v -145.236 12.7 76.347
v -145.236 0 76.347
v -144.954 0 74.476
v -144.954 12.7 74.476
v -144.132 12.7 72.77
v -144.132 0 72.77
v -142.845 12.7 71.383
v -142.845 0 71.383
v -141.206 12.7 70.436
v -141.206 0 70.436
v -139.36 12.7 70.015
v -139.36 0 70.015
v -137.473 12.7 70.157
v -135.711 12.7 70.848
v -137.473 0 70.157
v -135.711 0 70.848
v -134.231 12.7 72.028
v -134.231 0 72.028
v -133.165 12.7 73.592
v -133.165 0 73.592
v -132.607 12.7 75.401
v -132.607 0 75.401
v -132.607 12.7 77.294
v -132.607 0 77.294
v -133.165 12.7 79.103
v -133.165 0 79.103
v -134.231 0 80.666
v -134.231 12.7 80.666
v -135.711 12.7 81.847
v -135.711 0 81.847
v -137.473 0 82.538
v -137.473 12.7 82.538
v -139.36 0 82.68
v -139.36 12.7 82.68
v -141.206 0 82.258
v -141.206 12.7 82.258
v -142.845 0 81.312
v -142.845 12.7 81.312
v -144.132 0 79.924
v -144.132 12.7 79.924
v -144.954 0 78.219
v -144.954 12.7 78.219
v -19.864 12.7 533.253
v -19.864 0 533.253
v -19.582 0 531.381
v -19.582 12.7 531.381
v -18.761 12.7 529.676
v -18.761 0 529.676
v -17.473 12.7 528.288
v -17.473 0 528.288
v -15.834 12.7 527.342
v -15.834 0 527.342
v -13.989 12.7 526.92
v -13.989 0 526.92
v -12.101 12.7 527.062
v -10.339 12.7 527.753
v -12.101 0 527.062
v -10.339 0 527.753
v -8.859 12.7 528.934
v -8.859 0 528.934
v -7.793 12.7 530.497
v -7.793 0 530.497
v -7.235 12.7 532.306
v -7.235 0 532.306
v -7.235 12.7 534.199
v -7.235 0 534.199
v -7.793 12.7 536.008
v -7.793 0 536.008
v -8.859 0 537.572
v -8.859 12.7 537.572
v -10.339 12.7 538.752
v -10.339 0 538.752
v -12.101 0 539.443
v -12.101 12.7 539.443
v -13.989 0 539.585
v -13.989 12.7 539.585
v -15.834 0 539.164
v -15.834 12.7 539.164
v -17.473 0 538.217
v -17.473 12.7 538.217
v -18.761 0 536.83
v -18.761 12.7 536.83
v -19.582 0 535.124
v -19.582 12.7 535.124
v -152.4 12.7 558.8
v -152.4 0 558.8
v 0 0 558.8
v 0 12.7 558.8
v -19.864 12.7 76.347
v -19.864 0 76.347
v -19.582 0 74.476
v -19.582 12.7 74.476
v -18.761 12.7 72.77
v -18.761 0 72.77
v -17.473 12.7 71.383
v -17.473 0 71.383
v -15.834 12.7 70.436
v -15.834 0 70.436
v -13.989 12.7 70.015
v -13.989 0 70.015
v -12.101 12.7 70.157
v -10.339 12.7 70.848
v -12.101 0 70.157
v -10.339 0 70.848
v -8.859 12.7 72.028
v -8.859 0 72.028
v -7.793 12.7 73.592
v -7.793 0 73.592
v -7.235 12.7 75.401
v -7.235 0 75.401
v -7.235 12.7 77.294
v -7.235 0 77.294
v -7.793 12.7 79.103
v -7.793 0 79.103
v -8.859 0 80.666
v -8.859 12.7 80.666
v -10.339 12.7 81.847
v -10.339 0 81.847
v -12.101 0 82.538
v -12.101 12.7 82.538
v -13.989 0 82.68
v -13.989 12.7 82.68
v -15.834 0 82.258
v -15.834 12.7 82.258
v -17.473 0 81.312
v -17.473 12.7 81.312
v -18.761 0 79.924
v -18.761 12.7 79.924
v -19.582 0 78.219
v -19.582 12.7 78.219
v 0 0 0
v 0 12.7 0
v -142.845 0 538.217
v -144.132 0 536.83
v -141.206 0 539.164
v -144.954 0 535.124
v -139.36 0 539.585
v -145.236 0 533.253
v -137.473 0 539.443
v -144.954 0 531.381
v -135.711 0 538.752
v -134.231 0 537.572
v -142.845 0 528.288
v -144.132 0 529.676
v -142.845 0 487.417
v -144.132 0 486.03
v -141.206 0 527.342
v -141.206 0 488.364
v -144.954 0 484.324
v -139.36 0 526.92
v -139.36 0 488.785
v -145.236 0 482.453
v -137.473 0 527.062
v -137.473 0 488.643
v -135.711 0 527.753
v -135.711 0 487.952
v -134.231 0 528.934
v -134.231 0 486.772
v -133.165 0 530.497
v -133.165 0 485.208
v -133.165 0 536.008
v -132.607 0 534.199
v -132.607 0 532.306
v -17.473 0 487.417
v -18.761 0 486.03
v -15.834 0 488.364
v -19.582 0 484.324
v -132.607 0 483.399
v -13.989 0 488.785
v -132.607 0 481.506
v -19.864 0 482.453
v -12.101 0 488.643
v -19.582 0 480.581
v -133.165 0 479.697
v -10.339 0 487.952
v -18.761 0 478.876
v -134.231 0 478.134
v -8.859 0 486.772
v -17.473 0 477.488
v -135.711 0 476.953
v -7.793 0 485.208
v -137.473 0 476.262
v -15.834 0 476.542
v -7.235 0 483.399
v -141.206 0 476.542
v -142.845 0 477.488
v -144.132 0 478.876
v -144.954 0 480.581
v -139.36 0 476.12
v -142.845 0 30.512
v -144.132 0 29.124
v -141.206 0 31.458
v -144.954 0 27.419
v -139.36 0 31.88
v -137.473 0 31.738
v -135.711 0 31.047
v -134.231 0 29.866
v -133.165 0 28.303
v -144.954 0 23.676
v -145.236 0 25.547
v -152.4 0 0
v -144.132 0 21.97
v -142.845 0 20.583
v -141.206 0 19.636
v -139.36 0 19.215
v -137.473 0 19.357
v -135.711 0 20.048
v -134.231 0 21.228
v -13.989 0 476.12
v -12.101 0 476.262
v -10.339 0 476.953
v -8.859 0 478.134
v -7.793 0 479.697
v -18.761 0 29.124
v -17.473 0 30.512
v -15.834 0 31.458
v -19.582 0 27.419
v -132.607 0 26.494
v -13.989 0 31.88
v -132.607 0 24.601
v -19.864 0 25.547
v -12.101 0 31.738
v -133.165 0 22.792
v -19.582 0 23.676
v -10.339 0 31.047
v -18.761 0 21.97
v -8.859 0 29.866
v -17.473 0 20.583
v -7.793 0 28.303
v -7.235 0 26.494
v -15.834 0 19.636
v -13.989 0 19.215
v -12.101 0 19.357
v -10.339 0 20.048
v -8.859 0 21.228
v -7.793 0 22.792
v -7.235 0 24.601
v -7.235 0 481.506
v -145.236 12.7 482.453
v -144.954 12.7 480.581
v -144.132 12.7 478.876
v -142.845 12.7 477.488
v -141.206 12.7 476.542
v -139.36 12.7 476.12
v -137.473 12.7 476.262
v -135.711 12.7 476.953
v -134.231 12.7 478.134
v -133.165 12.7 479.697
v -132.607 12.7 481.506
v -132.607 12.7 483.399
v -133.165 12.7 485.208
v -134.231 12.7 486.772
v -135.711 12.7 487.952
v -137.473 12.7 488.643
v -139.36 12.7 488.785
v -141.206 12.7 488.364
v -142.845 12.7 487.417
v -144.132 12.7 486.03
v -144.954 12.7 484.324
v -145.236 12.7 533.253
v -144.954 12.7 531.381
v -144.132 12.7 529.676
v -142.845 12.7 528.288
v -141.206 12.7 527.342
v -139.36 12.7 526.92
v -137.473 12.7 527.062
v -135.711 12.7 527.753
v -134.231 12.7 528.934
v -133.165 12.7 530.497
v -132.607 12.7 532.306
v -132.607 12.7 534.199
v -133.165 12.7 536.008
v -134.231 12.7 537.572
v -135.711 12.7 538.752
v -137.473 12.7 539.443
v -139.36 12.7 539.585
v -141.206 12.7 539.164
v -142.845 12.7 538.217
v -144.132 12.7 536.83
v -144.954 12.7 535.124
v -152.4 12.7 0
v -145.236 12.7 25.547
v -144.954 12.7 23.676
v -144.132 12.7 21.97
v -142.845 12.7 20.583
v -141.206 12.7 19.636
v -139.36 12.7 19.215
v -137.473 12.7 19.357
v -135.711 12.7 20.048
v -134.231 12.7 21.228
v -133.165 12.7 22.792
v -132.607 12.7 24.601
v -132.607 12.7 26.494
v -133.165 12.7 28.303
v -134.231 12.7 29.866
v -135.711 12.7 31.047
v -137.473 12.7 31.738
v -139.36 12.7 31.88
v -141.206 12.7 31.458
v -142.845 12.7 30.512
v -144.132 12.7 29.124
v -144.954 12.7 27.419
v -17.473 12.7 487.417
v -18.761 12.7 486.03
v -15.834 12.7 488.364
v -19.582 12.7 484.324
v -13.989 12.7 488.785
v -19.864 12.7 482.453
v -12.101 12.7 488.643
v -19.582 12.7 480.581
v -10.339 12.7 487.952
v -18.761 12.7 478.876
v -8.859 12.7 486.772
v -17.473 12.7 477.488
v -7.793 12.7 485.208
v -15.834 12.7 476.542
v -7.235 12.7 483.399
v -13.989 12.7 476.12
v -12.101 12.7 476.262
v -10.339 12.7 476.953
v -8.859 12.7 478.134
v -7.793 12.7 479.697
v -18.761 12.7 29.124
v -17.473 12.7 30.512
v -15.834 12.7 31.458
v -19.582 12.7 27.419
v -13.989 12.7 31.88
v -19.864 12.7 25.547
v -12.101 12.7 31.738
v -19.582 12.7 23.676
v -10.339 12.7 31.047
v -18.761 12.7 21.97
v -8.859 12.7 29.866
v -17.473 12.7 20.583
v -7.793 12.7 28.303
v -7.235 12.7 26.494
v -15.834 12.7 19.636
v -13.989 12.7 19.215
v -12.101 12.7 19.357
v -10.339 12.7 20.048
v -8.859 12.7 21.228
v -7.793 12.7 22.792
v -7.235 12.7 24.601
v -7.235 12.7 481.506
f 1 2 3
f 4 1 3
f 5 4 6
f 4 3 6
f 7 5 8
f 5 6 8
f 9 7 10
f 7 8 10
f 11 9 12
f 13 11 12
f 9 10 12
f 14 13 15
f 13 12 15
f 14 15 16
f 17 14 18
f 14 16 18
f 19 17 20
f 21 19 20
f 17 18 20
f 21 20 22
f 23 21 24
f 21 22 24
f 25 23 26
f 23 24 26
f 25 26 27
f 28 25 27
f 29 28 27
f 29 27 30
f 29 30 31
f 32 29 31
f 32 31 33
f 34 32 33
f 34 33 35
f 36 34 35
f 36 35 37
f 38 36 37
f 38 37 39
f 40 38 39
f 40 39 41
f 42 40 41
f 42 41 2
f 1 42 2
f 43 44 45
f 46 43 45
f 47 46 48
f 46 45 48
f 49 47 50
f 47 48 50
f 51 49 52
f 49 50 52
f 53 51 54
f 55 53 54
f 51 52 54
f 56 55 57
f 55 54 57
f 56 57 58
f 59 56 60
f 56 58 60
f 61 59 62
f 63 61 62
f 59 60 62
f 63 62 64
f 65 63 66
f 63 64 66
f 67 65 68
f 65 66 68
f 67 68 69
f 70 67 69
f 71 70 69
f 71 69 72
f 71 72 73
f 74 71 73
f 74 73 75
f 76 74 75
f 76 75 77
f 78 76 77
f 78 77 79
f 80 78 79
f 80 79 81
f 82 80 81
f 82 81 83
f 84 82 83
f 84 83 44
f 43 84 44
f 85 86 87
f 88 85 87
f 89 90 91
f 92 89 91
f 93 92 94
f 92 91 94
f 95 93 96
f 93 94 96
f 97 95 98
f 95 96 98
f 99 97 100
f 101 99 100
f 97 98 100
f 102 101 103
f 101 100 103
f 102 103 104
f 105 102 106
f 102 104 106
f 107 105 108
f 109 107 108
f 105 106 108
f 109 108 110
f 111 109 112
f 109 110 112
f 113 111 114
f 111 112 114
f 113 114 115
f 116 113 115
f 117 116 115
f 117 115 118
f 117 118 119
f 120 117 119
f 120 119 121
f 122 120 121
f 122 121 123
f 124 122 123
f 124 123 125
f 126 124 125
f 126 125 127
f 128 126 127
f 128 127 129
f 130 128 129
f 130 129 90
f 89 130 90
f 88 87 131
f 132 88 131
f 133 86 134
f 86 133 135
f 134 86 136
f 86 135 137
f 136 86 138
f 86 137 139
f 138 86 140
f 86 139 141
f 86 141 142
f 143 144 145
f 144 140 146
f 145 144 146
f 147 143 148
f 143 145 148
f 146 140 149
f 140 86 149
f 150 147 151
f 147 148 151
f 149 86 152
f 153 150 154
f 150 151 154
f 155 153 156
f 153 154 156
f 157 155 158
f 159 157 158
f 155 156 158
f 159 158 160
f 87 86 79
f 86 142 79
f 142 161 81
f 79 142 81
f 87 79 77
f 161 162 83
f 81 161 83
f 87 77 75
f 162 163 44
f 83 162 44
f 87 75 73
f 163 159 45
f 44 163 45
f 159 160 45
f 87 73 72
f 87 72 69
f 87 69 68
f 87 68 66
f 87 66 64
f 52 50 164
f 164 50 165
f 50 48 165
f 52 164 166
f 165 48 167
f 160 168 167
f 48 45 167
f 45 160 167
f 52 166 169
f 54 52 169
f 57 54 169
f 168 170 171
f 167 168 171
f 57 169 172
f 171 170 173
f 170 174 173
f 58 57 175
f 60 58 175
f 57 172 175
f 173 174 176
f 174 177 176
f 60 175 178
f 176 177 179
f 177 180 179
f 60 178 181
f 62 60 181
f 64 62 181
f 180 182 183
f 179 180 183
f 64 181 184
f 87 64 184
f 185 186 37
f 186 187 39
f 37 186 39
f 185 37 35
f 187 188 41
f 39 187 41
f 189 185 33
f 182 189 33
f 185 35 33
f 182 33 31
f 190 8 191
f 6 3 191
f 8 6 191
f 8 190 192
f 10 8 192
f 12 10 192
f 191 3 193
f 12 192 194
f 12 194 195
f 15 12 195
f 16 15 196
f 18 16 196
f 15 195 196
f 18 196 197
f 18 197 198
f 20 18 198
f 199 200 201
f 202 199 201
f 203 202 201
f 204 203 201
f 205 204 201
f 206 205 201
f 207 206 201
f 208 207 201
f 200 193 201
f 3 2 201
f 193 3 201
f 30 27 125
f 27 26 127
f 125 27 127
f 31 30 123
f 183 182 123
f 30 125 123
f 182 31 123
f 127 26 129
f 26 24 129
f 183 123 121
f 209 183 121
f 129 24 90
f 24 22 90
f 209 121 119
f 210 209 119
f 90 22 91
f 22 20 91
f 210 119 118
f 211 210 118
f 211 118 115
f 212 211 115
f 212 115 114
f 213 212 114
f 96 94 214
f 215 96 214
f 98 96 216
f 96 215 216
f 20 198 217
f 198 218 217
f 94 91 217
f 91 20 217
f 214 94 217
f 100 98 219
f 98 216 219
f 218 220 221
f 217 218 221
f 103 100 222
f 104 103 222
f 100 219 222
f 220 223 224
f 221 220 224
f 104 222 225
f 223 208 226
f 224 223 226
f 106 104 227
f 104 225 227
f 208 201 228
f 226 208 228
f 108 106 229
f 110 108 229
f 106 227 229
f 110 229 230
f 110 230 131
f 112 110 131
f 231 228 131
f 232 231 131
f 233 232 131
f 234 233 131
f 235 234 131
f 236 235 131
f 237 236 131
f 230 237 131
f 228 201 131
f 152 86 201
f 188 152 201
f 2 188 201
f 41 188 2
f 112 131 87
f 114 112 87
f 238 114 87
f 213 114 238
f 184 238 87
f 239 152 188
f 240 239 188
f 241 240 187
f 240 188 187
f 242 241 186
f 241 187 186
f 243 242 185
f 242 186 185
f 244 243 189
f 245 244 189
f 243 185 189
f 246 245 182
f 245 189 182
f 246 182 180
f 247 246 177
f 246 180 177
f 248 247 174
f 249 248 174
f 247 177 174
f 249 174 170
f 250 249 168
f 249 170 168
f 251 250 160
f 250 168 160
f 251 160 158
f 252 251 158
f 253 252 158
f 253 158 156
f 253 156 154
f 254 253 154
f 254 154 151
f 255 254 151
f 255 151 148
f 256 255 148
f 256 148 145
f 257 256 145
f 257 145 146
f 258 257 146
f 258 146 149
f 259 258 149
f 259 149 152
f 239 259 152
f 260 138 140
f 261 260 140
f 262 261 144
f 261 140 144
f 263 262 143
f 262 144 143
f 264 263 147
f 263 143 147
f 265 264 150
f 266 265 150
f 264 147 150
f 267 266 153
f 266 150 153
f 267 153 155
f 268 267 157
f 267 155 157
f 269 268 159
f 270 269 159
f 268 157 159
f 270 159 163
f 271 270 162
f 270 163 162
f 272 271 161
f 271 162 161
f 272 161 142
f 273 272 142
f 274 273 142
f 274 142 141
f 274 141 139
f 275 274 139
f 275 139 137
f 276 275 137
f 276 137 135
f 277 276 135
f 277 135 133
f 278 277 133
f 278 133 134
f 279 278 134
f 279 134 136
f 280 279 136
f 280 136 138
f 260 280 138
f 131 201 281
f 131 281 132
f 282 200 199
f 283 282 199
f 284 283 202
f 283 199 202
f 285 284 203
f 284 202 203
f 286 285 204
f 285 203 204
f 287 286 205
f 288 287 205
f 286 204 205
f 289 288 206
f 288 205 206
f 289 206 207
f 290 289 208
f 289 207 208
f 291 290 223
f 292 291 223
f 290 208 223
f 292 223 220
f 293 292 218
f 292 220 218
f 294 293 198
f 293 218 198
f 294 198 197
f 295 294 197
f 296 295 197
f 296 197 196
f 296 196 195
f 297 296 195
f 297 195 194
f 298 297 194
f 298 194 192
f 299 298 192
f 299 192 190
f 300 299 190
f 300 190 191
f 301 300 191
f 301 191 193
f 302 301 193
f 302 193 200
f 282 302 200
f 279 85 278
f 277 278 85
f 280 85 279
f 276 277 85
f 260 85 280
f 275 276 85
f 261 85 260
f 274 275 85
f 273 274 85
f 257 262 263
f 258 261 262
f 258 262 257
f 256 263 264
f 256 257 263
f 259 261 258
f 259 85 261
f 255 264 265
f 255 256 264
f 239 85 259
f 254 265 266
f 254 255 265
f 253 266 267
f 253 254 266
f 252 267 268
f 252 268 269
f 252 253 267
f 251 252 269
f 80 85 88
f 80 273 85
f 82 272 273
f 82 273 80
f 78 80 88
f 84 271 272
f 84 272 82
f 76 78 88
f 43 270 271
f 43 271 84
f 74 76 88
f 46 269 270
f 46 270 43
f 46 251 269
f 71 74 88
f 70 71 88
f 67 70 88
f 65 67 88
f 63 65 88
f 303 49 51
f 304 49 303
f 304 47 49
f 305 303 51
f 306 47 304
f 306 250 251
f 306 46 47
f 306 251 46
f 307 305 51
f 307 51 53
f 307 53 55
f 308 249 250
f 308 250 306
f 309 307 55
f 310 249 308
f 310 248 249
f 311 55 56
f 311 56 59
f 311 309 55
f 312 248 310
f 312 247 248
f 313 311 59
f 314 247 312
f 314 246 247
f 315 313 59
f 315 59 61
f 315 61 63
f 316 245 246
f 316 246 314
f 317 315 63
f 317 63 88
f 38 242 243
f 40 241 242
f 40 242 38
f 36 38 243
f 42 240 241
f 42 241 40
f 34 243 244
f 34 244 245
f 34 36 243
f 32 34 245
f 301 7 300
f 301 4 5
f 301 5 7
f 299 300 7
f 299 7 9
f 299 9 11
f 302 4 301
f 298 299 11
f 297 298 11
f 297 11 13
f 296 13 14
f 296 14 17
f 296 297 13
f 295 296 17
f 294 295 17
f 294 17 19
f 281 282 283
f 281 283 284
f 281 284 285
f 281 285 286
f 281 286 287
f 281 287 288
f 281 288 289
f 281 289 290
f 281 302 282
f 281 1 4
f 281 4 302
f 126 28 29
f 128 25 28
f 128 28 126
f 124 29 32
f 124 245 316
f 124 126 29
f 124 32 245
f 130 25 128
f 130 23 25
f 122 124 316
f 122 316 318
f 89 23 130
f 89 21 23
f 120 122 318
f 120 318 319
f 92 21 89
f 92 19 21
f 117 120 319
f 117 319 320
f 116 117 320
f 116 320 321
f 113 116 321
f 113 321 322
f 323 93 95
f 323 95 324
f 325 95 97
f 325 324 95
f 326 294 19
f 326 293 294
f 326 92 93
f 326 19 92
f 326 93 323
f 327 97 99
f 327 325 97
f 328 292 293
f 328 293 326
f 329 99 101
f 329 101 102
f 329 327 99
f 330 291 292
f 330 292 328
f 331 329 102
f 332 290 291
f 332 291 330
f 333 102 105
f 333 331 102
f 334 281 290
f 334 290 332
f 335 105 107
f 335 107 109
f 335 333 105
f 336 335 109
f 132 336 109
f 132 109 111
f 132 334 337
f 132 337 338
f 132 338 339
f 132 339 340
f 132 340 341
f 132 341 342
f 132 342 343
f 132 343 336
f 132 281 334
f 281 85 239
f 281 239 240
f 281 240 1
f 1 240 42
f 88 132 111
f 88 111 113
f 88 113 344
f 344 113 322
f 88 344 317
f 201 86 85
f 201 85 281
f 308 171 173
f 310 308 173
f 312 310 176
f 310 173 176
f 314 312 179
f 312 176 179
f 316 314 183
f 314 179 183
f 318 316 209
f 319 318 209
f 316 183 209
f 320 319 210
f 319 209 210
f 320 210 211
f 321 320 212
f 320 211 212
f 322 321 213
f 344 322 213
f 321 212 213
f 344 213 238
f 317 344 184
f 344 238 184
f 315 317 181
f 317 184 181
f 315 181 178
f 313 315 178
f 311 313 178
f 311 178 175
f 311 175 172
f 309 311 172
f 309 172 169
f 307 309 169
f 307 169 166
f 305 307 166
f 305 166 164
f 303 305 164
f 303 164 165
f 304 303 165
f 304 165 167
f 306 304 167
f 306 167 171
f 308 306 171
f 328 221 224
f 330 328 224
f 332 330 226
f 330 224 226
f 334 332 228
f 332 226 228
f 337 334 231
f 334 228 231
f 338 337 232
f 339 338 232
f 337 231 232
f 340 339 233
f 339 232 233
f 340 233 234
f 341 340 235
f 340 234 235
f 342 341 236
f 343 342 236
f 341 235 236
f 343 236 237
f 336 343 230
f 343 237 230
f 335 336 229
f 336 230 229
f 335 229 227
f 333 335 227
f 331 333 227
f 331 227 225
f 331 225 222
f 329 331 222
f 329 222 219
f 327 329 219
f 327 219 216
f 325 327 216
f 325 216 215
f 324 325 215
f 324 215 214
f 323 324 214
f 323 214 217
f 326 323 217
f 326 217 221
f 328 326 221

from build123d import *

# Parameters (mm, degrees)
SKETCH1_W           = 152.4
SKETCH1_H           = 558.8
BOSS_EXTRUDE1_DEPTH = 12.7
CUT_EXTRUDE1_REACH  = 14.7
SKETCH2_R           = 6.35


with BuildPart() as part:
    # Sketch1 → Boss-Extrude1 (new body)
    with BuildSketch(Plane(origin=(0, 0, 0), x_dir=(1, 0, 0), z_dir=(0, 1, 0))):
        with Locations((-76.2, -279.4)):
            Rectangle(SKETCH1_W, SKETCH1_H)
    extrude(amount=BOSS_EXTRUDE1_DEPTH)

    # Sketch2 → Cut-Extrude1 (cut, up to next)
    with BuildSketch(Plane(origin=(0, 0, 0), x_dir=(-1, 0, 0), z_dir=(0, -1, 0)), mode=Mode.PRIVATE) as cut_extrude1_sk1:
        with Locations((13.51432586, -25.547353246)):
            Circle(SKETCH2_R)
    cut_extrude1_tool1 = extrude(cut_extrude1_sk1.sketch, amount=-CUT_EXTRUDE1_REACH, mode=Mode.PRIVATE) & part.part
    add(cut_extrude1_tool1.solids().sort_by_distance((-13.514326, 0, 25.547353))[0], mode=Mode.SUBTRACT)
    # Sketch2 → Cut-Extrude1 (cut, up to next)
    with BuildSketch(Plane(origin=(0, 0, 0), x_dir=(-1, 0, 0), z_dir=(0, -1, 0)), mode=Mode.PRIVATE) as cut_extrude1_sk2:
        with Locations((13.51432586, -76.347353246)):
            Circle(SKETCH2_R)
    cut_extrude1_tool2 = extrude(cut_extrude1_sk2.sketch, amount=-CUT_EXTRUDE1_REACH, mode=Mode.PRIVATE) & part.part
    add(cut_extrude1_tool2.solids().sort_by_distance((-13.514326, 0, 76.347353))[0], mode=Mode.SUBTRACT)
    # Sketch2 → Cut-Extrude1 (cut, up to next)
    with BuildSketch(Plane(origin=(0, 0, 0), x_dir=(-1, 0, 0), z_dir=(0, -1, 0)), mode=Mode.PRIVATE) as cut_extrude1_sk3:
        with Locations((13.51432586, -482.452646754)):
            Circle(SKETCH2_R)
    cut_extrude1_tool3 = extrude(cut_extrude1_sk3.sketch, amount=-CUT_EXTRUDE1_REACH, mode=Mode.PRIVATE) & part.part
    add(cut_extrude1_tool3.solids().sort_by_distance((-13.514326, 0, 482.452647))[0], mode=Mode.SUBTRACT)
    # Sketch2 → Cut-Extrude1 (cut, up to next)
    with BuildSketch(Plane(origin=(0, 0, 0), x_dir=(-1, 0, 0), z_dir=(0, -1, 0)), mode=Mode.PRIVATE) as cut_extrude1_sk4:
        with Locations((13.51432586, -533.252646754)):
            Circle(SKETCH2_R)
    cut_extrude1_tool4 = extrude(cut_extrude1_sk4.sketch, amount=-CUT_EXTRUDE1_REACH, mode=Mode.PRIVATE) & part.part
    add(cut_extrude1_tool4.solids().sort_by_distance((-13.514326, 0, 533.252647))[0], mode=Mode.SUBTRACT)
    # Sketch2 → Cut-Extrude1 (cut, up to next)
    with BuildSketch(Plane(origin=(0, 0, 0), x_dir=(-1, 0, 0), z_dir=(0, -1, 0)), mode=Mode.PRIVATE) as cut_extrude1_sk5:
        with Locations((138.88567414, -76.347353246)):
            Circle(SKETCH2_R)
    cut_extrude1_tool5 = extrude(cut_extrude1_sk5.sketch, amount=-CUT_EXTRUDE1_REACH, mode=Mode.PRIVATE) & part.part
    add(cut_extrude1_tool5.solids().sort_by_distance((-138.885674, 0, 76.347353))[0], mode=Mode.SUBTRACT)
    # Sketch2 → Cut-Extrude1 (cut, up to next)
    with BuildSketch(Plane(origin=(0, 0, 0), x_dir=(-1, 0, 0), z_dir=(0, -1, 0)), mode=Mode.PRIVATE) as cut_extrude1_sk6:
        with Locations((138.88567414, -25.547353246)):
            Circle(SKETCH2_R)
    cut_extrude1_tool6 = extrude(cut_extrude1_sk6.sketch, amount=-CUT_EXTRUDE1_REACH, mode=Mode.PRIVATE) & part.part
    add(cut_extrude1_tool6.solids().sort_by_distance((-138.885674, 0, 25.547353))[0], mode=Mode.SUBTRACT)
    # Sketch2 → Cut-Extrude1 (cut, up to next)
    with BuildSketch(Plane(origin=(0, 0, 0), x_dir=(-1, 0, 0), z_dir=(0, -1, 0)), mode=Mode.PRIVATE) as cut_extrude1_sk7:
        with Locations((138.88567414, -482.452646754)):
            Circle(SKETCH2_R)
    cut_extrude1_tool7 = extrude(cut_extrude1_sk7.sketch, amount=-CUT_EXTRUDE1_REACH, mode=Mode.PRIVATE) & part.part
    add(cut_extrude1_tool7.solids().sort_by_distance((-138.885674, 0, 482.452647))[0], mode=Mode.SUBTRACT)
    # Sketch2 → Cut-Extrude1 (cut, up to next)
    with BuildSketch(Plane(origin=(0, 0, 0), x_dir=(-1, 0, 0), z_dir=(0, -1, 0)), mode=Mode.PRIVATE) as cut_extrude1_sk8:
        with Locations((138.88567414, -533.252646754)):
            Circle(SKETCH2_R)
    cut_extrude1_tool8 = extrude(cut_extrude1_sk8.sketch, amount=-CUT_EXTRUDE1_REACH, mode=Mode.PRIVATE) & part.part
    add(cut_extrude1_tool8.solids().sort_by_distance((-138.885674, 0, 533.252647))[0], mode=Mode.SUBTRACT)


solid = part.part
